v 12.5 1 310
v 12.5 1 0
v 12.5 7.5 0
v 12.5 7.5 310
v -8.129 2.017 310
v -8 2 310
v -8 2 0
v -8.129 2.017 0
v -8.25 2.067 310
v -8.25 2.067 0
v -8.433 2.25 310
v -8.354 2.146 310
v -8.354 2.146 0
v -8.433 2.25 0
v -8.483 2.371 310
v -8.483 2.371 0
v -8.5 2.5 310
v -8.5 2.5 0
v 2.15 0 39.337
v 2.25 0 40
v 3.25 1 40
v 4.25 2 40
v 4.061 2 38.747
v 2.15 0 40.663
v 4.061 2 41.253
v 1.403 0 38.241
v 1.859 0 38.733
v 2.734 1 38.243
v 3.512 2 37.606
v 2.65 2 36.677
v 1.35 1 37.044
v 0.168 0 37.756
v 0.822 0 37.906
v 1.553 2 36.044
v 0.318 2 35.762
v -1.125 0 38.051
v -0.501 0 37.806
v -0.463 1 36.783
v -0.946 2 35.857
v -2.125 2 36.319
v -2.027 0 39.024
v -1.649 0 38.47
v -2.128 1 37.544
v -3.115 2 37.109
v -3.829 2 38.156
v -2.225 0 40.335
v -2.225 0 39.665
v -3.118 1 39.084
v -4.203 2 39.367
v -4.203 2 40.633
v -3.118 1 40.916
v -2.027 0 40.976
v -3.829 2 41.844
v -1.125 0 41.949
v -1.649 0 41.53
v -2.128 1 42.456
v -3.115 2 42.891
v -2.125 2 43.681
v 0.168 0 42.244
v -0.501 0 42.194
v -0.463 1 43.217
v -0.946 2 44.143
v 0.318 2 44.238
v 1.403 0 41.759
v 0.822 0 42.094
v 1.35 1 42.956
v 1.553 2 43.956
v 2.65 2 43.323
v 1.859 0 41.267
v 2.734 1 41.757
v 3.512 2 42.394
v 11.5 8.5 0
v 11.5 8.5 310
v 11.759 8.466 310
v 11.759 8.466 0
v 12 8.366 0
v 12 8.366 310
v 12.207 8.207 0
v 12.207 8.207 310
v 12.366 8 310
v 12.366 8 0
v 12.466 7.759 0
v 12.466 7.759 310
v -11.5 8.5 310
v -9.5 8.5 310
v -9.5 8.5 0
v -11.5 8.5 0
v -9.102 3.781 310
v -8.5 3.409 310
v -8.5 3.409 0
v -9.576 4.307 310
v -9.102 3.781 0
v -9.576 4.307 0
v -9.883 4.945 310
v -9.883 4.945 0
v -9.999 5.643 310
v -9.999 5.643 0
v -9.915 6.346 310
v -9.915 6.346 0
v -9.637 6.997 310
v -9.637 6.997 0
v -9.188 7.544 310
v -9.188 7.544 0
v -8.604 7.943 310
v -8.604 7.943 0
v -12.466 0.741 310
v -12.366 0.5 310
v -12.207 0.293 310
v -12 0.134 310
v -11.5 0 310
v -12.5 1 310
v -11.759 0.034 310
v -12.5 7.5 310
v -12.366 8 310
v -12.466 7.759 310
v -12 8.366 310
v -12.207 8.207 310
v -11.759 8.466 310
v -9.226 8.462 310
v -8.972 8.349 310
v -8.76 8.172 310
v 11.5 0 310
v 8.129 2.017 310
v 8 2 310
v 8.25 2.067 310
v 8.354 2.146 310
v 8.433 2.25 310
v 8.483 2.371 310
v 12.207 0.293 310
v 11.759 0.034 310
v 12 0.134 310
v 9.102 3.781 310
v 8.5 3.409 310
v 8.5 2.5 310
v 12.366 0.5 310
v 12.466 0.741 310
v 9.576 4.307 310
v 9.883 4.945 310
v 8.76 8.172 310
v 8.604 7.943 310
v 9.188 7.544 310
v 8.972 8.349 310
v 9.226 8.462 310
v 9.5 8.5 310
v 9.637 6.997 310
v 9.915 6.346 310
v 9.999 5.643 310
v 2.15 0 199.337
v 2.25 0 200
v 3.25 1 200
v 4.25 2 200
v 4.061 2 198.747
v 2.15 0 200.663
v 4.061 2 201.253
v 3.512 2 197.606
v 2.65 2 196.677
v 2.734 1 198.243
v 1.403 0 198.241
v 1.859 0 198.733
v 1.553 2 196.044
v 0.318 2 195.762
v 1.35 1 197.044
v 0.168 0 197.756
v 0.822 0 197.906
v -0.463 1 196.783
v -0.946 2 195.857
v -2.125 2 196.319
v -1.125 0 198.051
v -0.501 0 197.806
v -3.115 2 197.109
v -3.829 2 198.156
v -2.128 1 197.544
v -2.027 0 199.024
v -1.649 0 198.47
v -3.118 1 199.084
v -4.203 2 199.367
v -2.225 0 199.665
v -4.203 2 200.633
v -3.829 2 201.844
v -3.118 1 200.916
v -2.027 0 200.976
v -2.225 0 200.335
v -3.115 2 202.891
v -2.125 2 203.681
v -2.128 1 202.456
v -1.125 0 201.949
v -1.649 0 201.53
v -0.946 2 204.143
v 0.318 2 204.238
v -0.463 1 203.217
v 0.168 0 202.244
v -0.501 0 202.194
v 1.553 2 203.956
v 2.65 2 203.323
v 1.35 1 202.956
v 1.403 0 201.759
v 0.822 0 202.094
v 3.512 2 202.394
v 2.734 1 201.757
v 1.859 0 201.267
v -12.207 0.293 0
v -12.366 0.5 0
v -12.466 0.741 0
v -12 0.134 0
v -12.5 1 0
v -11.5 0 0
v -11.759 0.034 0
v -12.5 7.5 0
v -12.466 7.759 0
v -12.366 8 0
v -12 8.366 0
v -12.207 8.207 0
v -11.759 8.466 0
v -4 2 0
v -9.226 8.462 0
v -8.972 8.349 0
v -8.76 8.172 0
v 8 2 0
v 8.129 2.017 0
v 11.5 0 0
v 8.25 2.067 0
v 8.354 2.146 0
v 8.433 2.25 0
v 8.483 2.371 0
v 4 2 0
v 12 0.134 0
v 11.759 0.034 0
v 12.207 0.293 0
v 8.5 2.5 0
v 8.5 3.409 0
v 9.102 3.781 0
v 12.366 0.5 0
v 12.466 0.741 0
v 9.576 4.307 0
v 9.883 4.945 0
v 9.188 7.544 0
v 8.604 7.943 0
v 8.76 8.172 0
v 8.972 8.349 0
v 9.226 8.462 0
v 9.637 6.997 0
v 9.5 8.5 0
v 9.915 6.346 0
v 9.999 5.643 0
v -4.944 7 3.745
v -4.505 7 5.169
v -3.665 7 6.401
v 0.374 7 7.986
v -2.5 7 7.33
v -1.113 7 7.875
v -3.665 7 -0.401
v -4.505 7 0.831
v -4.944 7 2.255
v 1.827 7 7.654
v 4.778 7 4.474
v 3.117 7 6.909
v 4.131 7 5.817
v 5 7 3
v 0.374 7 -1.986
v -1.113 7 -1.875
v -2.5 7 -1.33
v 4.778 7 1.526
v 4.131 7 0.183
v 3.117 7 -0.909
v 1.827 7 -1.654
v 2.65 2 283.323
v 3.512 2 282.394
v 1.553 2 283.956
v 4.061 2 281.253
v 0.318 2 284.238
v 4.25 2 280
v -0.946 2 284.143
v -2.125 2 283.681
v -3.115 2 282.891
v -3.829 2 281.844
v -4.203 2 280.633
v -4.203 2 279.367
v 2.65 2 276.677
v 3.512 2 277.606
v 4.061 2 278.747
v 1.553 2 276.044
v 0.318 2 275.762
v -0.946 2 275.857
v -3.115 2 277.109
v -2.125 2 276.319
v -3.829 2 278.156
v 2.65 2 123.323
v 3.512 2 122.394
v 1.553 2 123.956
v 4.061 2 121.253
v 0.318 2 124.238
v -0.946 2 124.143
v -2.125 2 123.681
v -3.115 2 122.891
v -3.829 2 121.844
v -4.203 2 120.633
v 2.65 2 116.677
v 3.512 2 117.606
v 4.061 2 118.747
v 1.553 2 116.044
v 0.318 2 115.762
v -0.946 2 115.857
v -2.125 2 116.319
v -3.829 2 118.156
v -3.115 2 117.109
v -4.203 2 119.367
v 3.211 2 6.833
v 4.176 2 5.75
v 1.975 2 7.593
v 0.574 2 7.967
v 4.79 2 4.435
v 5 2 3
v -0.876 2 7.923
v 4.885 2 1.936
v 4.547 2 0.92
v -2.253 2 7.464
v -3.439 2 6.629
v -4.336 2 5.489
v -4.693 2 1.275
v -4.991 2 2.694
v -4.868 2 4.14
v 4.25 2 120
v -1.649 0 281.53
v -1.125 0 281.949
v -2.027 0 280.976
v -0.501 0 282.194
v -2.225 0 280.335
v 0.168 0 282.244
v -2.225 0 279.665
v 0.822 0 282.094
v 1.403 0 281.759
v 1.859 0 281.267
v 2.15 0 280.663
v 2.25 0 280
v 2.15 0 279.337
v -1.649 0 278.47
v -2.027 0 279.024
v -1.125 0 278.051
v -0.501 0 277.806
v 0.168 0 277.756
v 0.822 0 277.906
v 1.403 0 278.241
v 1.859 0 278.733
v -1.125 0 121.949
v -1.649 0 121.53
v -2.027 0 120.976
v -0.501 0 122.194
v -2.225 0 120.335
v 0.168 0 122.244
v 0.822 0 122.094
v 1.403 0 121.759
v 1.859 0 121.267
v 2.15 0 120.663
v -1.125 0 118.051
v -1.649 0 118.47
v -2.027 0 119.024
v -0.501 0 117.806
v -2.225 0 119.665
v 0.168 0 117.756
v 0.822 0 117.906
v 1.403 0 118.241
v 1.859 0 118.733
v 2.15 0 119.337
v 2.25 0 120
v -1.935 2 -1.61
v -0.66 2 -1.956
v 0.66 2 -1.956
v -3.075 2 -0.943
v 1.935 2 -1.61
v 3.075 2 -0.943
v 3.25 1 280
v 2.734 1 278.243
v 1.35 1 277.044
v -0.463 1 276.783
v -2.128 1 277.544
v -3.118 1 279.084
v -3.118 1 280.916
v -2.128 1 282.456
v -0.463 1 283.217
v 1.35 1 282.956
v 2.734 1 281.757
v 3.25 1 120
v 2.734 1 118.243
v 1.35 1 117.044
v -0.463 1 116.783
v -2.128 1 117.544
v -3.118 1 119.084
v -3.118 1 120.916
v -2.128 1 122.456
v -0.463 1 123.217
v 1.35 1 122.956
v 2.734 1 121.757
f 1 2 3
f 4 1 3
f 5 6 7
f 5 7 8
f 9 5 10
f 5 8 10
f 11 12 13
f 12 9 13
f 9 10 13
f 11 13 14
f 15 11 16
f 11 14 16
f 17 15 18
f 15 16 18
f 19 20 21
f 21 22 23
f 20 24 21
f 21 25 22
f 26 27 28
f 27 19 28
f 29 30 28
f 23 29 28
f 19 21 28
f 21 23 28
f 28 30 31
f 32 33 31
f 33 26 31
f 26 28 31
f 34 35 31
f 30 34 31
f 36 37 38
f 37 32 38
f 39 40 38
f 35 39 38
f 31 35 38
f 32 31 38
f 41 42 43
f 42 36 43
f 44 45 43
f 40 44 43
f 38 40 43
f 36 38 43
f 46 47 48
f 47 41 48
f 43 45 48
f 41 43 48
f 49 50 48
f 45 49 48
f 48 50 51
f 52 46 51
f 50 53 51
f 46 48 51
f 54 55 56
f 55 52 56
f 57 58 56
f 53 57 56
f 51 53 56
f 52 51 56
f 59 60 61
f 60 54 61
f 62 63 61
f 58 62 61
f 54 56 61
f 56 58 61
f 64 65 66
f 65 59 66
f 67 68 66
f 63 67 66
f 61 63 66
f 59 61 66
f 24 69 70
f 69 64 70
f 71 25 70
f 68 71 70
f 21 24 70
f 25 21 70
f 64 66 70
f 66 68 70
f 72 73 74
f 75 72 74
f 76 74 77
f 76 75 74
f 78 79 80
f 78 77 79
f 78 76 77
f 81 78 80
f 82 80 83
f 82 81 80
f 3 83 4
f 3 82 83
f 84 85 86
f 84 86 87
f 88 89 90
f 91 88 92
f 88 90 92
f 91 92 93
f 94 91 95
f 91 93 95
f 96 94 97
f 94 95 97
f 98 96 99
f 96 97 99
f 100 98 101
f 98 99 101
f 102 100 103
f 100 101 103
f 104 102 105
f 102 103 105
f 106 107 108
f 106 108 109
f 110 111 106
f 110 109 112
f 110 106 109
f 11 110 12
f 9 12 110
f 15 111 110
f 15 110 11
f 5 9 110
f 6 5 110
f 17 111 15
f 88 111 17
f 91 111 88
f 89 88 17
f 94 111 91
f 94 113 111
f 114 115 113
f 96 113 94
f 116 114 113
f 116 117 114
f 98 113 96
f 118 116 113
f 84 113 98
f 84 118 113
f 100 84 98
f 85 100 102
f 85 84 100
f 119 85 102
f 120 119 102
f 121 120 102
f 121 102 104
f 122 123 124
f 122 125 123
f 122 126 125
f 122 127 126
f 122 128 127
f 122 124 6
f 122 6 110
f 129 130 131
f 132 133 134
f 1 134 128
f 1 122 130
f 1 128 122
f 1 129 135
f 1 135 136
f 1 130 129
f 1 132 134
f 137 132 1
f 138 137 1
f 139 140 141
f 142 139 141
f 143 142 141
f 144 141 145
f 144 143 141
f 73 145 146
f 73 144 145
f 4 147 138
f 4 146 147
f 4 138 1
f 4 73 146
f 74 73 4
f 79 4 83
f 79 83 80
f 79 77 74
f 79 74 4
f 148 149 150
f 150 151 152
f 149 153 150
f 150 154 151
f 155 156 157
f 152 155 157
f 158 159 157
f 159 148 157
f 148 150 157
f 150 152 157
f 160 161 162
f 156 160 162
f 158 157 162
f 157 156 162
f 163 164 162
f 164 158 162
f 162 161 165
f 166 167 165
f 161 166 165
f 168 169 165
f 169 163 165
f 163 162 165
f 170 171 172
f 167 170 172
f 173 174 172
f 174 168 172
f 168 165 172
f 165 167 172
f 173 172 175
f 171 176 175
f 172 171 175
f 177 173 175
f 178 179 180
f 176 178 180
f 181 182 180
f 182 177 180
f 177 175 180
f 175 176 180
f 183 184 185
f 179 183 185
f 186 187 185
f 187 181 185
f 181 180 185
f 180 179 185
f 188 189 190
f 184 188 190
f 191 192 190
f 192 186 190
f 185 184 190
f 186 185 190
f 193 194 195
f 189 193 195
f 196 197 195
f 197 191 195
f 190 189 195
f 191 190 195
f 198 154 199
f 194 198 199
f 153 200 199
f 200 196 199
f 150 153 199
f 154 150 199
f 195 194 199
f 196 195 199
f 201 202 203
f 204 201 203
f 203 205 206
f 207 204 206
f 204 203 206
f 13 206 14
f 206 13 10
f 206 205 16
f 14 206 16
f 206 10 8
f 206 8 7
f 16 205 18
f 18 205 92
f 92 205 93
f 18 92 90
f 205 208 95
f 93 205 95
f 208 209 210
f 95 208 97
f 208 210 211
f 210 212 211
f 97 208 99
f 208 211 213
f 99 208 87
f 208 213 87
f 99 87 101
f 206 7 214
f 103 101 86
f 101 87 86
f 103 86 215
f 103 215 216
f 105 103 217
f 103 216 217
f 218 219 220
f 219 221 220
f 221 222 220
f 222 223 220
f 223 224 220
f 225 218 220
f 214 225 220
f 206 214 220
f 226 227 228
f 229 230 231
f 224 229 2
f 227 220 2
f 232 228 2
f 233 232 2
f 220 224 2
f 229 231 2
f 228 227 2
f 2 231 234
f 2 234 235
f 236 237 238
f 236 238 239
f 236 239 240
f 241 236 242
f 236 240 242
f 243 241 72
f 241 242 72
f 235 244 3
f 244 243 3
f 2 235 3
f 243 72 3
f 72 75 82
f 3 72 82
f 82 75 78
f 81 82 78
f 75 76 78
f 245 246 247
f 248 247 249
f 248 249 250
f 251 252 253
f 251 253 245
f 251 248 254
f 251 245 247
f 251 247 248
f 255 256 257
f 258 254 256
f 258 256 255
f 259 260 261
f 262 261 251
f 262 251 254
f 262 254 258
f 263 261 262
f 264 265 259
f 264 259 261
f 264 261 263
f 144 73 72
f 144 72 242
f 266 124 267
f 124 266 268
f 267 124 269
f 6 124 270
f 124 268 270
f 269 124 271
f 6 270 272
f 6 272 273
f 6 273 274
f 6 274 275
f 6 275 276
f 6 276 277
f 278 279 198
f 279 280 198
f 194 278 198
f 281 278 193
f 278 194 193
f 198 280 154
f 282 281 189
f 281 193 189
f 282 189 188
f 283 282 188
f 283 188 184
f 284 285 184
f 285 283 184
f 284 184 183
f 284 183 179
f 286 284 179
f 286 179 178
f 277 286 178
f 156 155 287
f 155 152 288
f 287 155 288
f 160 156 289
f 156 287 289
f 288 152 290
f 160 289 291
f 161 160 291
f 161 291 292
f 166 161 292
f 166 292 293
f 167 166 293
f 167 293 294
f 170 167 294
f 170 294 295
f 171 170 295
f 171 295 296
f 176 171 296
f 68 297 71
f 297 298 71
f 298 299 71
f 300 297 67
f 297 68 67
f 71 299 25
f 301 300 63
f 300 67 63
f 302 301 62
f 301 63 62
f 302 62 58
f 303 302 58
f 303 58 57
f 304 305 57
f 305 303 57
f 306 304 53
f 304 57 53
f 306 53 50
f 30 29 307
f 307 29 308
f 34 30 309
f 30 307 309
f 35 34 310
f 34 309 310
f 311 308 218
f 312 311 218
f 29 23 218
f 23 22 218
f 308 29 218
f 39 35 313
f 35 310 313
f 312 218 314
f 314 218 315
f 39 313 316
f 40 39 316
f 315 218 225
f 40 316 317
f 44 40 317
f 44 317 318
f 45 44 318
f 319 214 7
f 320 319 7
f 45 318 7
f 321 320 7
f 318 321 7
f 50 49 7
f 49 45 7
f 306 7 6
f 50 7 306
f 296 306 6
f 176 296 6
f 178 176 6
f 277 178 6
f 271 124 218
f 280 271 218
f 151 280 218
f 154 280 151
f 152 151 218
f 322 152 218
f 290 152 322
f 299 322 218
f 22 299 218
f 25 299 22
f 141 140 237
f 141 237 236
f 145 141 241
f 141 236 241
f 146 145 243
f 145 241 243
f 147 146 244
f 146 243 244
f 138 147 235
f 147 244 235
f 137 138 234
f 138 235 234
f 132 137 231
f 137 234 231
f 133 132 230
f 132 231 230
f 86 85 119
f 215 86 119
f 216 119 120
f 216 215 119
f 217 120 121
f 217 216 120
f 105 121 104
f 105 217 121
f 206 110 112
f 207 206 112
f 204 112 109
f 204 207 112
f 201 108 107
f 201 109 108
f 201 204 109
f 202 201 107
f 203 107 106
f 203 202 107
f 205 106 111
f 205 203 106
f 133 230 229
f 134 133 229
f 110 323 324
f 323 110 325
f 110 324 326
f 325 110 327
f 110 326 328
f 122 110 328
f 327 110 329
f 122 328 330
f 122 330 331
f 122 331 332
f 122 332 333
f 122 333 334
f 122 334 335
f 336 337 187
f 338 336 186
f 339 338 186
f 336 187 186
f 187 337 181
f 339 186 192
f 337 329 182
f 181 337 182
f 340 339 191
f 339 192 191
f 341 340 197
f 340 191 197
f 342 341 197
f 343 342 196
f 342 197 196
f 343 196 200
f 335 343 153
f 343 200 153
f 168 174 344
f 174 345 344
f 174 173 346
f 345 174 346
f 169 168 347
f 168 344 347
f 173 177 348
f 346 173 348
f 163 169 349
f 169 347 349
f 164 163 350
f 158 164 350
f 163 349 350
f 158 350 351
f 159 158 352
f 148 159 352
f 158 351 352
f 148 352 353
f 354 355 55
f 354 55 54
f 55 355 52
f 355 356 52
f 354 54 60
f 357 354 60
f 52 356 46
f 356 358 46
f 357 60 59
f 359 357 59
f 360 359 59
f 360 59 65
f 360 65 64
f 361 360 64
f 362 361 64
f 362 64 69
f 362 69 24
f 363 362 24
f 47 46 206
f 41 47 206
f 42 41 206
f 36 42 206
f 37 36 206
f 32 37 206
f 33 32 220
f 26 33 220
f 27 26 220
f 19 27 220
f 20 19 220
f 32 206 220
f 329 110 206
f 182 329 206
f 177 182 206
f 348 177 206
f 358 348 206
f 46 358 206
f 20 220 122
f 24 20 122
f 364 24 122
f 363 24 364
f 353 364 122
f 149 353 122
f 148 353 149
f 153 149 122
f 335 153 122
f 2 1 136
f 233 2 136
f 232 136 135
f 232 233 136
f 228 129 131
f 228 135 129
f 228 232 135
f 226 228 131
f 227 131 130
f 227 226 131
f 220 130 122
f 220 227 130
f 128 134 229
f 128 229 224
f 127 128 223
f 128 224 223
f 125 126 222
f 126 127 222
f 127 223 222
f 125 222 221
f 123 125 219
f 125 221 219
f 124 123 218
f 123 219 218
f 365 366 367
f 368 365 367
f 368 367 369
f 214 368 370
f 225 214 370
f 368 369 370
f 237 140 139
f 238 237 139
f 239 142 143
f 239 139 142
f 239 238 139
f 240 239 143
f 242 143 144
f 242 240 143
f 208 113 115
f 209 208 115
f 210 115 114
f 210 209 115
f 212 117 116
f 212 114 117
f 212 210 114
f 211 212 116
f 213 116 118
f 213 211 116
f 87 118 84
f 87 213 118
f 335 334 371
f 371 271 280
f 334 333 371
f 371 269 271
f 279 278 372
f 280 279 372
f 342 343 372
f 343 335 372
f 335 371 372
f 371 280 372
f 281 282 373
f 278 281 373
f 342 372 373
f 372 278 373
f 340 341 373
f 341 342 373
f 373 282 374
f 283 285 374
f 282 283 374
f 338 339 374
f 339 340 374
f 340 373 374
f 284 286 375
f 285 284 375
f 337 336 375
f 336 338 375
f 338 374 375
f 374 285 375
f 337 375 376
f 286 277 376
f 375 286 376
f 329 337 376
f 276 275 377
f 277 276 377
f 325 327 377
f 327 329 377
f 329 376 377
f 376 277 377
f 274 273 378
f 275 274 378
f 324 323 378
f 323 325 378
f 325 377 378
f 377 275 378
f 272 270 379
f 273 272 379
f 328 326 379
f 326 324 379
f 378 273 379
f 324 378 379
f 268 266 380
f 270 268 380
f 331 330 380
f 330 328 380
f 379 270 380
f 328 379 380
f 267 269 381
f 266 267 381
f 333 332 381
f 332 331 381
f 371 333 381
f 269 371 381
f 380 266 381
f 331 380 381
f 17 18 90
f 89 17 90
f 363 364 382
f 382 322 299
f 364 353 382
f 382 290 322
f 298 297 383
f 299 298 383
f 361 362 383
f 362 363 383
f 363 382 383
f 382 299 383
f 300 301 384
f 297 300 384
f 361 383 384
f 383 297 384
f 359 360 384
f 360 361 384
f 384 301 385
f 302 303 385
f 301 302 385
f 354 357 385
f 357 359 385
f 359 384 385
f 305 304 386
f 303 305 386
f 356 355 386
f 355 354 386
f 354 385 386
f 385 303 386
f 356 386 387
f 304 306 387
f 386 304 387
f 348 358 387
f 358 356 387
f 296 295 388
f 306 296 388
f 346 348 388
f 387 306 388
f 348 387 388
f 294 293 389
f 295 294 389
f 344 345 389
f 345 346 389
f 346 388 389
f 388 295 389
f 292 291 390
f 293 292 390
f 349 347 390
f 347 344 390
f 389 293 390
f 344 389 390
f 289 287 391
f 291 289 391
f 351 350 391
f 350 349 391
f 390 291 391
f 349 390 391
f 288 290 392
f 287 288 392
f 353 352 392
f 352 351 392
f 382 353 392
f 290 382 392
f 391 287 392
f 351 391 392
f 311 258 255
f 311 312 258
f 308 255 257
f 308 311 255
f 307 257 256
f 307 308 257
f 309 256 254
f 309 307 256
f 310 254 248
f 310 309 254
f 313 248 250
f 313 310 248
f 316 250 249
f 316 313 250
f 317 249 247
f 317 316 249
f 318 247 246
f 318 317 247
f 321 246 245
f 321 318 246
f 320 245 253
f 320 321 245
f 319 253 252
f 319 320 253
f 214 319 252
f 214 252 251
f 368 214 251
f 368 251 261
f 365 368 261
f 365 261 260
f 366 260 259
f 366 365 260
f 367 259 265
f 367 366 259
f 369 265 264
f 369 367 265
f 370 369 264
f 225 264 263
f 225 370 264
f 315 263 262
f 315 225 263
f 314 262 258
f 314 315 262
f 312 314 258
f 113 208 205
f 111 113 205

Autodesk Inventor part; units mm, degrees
sketch "Sketch_1" plane through (0, 0, 0) normal (0, 0, 1) x (1, 0, 0)
  arc A0 (-12.5, 1) -> (-11.5, 0) centre (-11.5, 1) ccw
  line L0 (-11.5, 0) -> (11.5, 0)
  arc A1 (11.5, 0) -> (12.5, 1) centre (11.5, 1) ccw
  line L1 (12.5, 1) -> (12.5, 7.5)
  arc A2 (12.5, 7.5) -> (11.5, 8.5) centre (11.5, 7.5) ccw
  line L2 (11.5, 8.5) -> (9.5, 8.5)
  arc A3 (9.5, 8.5) -> (8.6036, 7.9432) centre (9.5, 7.5) ccw
  arc A4 (8.5, 3.4087) -> (8.6036, 7.9432) centre (7.5, 5.7) ccw
  line L3 (8.5, 3.4087) -> (8.5, 2.5)
  arc A5 (8, 2) -> (8.5, 2.5) centre (8, 2.5) ccw
  line L4 (8, 2) -> (-8, 2)
  arc A6 (-8.5, 2.5) -> (-8, 2) centre (-8, 2.5) ccw
  line L5 (-8.5, 2.5) -> (-8.5, 3.4087)
  arc A7 (-8.6036, 7.9432) -> (-8.5, 3.4087) centre (-7.5, 5.7) ccw
  arc A8 (-8.6036, 7.9432) -> (-9.5, 8.5) centre (-9.5, 7.5) ccw
  line L6 (-9.5, 8.5) -> (-11.5, 8.5)
  arc A9 (-11.5, 8.5) -> (-12.5, 7.5) centre (-11.5, 7.5) ccw
  line L7 (-12.5, 7.5) -> (-12.5, 1)
extrude "Extrusion1" add sketch "Sketch_1" along normal blind 310
sketch "Sketch_2" plane through (0, 0, 40) normal (0, 0, 1) x (1, 0, 0)
  line L0 (0, 0) -> (0, 2)
  line L1 (0, 2) -> (4.25, 2)
  line L2 (4.25, 2) -> (2.25, 0)
  line L3 (2.25, 0) -> (0, 0)
  line L4 (0, 0) -> (0, 2)
revolve "Revolution1" cut sketch "Sketch_2" angle 360 about axis through (0, 0, 40) along (0, -1, 0)
pattern_linear "Rectangular Pattern1" count 11 spacing 80 along (0, 0, 1) of "Revolution1"
sketch "Sketch_4" plane through (0, 2, 0) normal (0, 1, 0) x (1, 0, 0)
  circle A0 centre (0, -3) radius 5
extrude "Extrusion2" add sketch "Sketch_4" along normal blind 5
sketch "Sketch_5" plane through (0, 2, 0) normal (0, 1, 0) x (1, 0, 0)
  circle A0 centre (0, -877) radius 5
extrude "Extrusion3" [suppressed]
ref_plane "rail25_to_dummy_XY" through (0, 0, 440) normal (0, 0, 1) x (1, 0, 0)
ref_plane "rail25_to_dummy_YZ" through (0, 0, 440) normal (1, 0, 0) x (0, 1, 0)
ref_plane "rail25_to_dummy_ZX" through (0, 0, 440) normal (0, 1, 0) x (0, 0, 1)
ref_plane "to_slider_XY" through (0, 12, 440) normal (0, 0, 1) x (1, 0, 0)
ref_plane "to_slider_YZ" through (0, 12, 440) normal (1, 0, 0) x (0, 1, 0)
ref_plane "to_slider_ZX" through (0, 12, 440) normal (0, 1, 0) x (0, 0, 1)
properties part number "RSRR25-880"
